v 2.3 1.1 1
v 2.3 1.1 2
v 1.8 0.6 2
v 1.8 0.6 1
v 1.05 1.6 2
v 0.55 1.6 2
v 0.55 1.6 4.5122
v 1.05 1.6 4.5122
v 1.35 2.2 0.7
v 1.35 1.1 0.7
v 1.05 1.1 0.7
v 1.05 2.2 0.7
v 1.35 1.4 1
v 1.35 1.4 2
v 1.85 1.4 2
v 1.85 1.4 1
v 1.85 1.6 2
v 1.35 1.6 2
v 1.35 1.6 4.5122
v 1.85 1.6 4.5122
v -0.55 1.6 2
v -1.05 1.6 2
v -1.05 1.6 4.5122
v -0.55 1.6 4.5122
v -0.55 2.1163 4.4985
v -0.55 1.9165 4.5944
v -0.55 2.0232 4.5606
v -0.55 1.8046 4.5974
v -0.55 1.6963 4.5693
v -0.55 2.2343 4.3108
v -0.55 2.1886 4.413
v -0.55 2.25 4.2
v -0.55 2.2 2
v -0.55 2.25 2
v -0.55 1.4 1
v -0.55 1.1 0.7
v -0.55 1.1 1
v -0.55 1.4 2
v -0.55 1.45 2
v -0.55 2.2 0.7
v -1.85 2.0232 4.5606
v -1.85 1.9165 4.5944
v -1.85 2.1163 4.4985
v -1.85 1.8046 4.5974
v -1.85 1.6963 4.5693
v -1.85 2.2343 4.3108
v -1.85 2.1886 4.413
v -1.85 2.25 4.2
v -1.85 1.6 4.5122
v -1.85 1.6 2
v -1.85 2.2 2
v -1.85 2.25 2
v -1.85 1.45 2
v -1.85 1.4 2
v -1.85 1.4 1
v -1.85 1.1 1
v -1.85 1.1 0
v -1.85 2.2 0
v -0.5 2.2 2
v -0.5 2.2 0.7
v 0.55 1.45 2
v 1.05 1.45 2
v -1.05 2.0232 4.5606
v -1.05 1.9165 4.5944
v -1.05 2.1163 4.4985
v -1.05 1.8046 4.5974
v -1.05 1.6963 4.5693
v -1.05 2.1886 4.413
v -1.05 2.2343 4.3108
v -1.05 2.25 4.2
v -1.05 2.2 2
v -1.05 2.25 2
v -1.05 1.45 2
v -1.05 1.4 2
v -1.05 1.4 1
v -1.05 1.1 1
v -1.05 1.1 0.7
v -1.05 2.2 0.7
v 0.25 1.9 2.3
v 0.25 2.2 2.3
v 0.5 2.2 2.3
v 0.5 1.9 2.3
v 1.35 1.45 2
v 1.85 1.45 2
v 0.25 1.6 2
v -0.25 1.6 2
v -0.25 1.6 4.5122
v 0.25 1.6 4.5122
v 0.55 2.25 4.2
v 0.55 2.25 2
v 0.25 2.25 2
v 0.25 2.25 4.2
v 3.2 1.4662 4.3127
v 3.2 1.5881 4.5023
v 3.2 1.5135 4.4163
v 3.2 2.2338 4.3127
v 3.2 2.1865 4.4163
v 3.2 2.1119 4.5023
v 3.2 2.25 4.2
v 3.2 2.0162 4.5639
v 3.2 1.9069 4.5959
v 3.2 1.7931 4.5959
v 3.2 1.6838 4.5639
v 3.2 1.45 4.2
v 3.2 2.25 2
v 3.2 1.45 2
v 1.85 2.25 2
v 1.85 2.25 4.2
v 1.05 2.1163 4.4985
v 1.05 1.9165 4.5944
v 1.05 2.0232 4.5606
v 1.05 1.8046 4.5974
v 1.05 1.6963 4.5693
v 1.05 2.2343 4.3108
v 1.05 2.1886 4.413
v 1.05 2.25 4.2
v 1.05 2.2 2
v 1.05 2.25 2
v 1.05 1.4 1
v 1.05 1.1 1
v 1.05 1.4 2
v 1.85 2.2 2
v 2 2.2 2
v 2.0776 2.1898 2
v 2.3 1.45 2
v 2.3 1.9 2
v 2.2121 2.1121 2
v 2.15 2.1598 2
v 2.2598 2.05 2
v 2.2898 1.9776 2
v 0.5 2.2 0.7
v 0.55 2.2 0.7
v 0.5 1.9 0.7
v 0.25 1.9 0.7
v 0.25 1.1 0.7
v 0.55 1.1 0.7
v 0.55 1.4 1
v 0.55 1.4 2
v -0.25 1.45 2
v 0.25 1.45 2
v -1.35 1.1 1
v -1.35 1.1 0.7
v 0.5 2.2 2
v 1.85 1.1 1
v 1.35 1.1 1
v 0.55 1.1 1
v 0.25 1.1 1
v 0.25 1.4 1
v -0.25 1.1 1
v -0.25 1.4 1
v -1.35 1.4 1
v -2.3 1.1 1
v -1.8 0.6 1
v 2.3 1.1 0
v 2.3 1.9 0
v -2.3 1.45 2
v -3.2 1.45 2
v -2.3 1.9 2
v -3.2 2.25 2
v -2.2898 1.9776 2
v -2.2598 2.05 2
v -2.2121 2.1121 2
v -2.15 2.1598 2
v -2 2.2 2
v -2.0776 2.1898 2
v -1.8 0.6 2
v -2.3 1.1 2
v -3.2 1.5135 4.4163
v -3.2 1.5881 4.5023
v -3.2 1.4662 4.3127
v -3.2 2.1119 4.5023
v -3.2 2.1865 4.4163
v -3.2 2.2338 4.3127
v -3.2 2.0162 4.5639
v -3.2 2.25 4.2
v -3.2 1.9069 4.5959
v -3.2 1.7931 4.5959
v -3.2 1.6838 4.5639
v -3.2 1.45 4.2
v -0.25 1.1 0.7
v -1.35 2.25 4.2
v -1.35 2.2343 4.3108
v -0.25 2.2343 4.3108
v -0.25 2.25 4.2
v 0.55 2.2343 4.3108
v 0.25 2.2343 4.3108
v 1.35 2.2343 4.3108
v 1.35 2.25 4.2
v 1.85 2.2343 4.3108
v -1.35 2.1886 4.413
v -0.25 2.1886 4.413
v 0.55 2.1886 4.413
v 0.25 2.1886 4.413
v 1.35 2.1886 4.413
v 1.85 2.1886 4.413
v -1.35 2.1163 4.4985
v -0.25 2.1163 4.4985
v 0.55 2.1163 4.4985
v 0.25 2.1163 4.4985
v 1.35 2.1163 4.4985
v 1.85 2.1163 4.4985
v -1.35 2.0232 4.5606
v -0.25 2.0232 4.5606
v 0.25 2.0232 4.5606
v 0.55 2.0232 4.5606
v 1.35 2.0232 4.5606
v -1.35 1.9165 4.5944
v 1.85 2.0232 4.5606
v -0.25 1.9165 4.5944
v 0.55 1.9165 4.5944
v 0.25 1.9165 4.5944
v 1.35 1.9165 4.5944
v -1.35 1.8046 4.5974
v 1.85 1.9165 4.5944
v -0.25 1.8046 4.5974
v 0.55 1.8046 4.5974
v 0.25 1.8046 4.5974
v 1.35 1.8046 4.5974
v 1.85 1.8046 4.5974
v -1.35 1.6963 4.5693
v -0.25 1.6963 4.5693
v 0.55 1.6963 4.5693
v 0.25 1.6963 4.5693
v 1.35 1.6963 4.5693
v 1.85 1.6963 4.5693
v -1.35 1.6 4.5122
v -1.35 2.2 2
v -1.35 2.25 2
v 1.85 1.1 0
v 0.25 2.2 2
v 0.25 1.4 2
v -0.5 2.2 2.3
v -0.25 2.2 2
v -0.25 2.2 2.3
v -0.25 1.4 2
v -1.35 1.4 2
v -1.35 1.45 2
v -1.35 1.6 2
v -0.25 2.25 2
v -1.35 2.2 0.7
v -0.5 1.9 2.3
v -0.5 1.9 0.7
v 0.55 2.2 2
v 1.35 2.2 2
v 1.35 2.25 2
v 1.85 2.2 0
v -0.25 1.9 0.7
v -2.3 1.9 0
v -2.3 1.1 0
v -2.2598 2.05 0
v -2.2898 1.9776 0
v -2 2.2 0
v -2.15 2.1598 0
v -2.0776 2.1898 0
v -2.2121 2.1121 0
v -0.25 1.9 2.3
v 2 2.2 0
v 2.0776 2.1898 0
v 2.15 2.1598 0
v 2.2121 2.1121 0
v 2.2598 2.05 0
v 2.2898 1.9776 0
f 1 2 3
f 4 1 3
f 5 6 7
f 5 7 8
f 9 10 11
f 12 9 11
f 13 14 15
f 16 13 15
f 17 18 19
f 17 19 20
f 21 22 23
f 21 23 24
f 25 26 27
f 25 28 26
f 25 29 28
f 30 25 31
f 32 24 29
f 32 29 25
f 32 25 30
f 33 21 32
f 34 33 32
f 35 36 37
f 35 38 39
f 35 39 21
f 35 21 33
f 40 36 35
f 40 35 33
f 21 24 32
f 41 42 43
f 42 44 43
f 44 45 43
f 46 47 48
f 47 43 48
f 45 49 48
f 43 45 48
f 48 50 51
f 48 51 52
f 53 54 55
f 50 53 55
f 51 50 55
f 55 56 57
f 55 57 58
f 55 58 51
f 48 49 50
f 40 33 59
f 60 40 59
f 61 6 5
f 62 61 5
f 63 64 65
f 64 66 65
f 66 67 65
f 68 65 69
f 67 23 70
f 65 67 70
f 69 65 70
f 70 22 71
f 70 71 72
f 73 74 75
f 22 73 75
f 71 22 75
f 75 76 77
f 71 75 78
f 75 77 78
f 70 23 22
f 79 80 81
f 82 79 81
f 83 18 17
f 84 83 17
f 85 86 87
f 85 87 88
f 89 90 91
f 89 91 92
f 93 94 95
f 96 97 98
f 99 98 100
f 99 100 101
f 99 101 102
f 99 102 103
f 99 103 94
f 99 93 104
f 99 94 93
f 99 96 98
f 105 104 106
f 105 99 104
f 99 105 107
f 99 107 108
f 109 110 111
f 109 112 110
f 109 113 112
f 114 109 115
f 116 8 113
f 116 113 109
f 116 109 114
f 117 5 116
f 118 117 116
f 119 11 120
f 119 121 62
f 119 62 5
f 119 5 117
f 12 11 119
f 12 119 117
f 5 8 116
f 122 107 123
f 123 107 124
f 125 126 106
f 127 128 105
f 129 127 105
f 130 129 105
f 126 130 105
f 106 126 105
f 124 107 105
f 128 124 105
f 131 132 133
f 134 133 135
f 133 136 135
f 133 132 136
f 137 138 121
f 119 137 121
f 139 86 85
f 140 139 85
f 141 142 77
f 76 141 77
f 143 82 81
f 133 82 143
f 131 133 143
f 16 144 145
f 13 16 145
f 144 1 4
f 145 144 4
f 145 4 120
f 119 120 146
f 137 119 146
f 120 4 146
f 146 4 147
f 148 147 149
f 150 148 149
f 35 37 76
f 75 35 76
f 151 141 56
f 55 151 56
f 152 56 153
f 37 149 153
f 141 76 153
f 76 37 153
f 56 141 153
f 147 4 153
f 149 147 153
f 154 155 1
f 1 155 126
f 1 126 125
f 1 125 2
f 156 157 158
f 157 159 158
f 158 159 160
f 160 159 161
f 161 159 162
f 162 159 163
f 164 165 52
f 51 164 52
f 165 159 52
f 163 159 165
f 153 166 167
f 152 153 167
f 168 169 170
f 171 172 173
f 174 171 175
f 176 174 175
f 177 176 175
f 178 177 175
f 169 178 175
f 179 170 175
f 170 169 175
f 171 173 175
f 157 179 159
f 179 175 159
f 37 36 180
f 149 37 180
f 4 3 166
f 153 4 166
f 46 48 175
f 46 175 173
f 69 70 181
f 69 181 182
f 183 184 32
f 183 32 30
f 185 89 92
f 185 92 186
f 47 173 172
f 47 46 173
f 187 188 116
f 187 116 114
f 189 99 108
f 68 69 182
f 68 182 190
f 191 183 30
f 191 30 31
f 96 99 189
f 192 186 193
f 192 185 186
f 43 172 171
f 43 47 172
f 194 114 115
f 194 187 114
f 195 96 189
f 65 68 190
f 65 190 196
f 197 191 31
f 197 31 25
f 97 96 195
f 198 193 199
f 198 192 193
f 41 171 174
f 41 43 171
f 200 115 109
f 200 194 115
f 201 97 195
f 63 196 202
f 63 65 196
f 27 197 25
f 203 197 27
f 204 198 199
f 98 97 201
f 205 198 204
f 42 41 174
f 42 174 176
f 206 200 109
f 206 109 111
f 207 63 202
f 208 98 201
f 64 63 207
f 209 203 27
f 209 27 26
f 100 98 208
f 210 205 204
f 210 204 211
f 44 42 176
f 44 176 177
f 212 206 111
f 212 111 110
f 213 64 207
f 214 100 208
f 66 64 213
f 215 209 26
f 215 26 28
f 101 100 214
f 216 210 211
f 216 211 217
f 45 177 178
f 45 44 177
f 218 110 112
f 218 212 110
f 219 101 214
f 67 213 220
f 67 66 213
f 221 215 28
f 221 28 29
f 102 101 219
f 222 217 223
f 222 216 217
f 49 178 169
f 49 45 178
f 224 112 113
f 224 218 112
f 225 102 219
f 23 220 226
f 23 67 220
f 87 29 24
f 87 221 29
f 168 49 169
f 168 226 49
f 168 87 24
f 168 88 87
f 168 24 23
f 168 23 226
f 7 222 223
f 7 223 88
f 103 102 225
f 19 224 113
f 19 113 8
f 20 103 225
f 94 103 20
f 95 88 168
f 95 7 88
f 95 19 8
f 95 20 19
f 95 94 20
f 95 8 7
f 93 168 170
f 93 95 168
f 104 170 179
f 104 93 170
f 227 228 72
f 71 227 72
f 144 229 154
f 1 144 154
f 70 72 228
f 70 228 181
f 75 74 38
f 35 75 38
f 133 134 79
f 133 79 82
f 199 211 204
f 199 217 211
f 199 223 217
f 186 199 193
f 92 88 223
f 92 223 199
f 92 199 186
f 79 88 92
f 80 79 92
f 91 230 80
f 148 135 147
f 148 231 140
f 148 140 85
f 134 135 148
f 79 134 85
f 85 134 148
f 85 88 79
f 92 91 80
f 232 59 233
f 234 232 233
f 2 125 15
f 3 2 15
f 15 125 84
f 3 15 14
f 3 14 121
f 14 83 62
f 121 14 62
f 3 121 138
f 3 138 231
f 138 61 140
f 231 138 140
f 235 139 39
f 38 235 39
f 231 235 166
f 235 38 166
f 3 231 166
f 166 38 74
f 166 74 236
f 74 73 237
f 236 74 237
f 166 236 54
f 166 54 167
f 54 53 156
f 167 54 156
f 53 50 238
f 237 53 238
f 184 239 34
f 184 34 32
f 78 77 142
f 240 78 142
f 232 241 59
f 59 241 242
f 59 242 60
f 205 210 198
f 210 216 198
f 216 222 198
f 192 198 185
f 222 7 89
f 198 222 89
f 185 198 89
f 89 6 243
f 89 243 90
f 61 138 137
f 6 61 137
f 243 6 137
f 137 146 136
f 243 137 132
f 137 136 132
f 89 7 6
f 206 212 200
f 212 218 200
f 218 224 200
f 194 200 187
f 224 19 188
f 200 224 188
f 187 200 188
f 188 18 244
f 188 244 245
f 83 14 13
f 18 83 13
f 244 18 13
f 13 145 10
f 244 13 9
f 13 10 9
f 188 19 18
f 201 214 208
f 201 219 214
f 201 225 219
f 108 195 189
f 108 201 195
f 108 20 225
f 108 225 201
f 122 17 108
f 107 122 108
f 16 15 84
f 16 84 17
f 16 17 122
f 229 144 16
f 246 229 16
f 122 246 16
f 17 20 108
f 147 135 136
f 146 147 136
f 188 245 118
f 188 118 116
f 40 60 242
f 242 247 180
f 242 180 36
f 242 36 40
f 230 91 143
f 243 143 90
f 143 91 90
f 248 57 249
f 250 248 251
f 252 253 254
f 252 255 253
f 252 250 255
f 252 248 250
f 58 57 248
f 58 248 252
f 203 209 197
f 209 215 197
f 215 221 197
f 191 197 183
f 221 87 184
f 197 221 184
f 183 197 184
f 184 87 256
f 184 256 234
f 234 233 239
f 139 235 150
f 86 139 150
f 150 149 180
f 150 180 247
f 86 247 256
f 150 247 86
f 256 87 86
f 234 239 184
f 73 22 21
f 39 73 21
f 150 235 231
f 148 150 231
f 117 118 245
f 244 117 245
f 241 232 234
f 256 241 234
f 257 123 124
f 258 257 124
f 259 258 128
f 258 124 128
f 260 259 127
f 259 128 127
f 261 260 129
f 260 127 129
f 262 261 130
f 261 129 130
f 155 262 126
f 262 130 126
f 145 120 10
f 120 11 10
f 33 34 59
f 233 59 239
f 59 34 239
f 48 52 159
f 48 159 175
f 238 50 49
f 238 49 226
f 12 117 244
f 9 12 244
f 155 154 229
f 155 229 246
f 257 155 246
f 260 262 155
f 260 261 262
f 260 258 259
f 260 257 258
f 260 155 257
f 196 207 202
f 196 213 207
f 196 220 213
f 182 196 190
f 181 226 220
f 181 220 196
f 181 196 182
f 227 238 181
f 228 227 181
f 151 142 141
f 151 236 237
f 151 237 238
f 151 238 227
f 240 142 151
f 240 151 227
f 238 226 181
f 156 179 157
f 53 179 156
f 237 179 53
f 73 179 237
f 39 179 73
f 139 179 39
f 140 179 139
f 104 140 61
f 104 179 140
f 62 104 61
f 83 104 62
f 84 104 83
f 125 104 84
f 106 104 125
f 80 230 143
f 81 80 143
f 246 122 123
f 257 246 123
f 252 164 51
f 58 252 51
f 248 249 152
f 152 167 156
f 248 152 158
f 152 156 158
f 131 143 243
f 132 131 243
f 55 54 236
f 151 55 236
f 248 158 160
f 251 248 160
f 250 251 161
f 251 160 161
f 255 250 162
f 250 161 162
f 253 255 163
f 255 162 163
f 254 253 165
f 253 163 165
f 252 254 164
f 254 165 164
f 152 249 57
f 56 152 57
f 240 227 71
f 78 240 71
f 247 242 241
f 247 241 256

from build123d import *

# Parameters (mm, degrees)
BOSS_EXTRUDE1_DEPTH = 2
BOSS_EXTRUDE2_DEPTH = 3.2
SKETCH3_OUTSIDE_W   = 10.04
SKETCH3_OUTSIDE_H   = 5.89
CUT_EXTRUDE1_DEPTH  = 4.8
SKETCH4_W           = 1
SKETCH4_H           = 0.3
CUT_EXTRUDE3_DEPTH  = 2.3
CUT_EXTRUDE6_DEPTH  = 7.038418667
SKETCH6_W           = 0.5
SKETCH6_H           = 0.5
CUT_EXTRUDE7_DEPTH  = 2
SKETCH7_W           = 0.5
SKETCH7_H           = 0.8
CUT_EXTRUDE8_DEPTH  = 7
SKETCH8_W           = 6
SKETCH8_H           = 1
CUT_EXTRUDE9_DEPTH  = 0.5


with BuildPart() as part:
    # Sketch1 → Boss-Extrude1 (new body)
    with BuildSketch(Plane.XY):
        with BuildLine():
            Line((-2.7, 1.5), (2.7, 1.5))
            ThreePointArc((2.7, 1.5), (2.912132034, 1.412132034), (3, 1.2))
            Line((3, 1.2), (3, 0))
            Line((3, 0), (-3, 0))
            Line((-3, 0), (-3, 1.2))
            ThreePointArc((-3, 1.2), (-2.912132034, 1.412132034), (-2.7, 1.5))
        make_face()
    extrude(amount=BOSS_EXTRUDE1_DEPTH)

    # Sketch2 → Boss-Extrude2 (add, symmetric)
    with BuildSketch(Plane(origin=(0, 0, 0), x_dir=(0, 0, -1), z_dir=(1, 0, 0))):
        with BuildLine():
            Line((0, 2.25), (-4.2, 2.25))
            ThreePointArc((-4.2, 2.25), (-4.6, 1.85), (-4.2, 1.45))
            Line((-4.2, 1.45), (0, 1.45))
            Line((0, 1.45), (0, 2.25))
        make_face()
    extrude(amount=BOSS_EXTRUDE2_DEPTH, both=True)

    # Sketch3 outside → Cut-Extrude1 (cut)
    with BuildSketch(Plane.XY.offset(2)):
        with Locations((0, 1.125)):
            Rectangle(SKETCH3_OUTSIDE_W, SKETCH3_OUTSIDE_H)
        with BuildLine():
            Line((-2, 2.2), (2, 2.2))
            ThreePointArc((2, 2.2), (2.212132034, 2.112132034), (2.3, 1.9))
            Line((2.3, 1.9), (2.3, 1.1))
            Line((2.3, 1.1), (1.8, 0.6))
            Line((1.8, 0.6), (-1.8, 0.6))
            Line((-1.8, 0.6), (-2.3, 1.1))
            Line((-2.3, 1.1), (-2.3, 1.9))
            ThreePointArc((-2.3, 1.9), (-2.212132034, 2.112132034), (-2, 2.2))
        make_face(mode=Mode.SUBTRACT)
    extrude(amount=-CUT_EXTRUDE1_DEPTH, mode=Mode.SUBTRACT)

    # Sketch4 → Cut-Extrude3 (cut)
    with BuildSketch(Plane.XY):
        with Locations((0, 2.05)):
            Rectangle(SKETCH4_W, SKETCH4_H)
    extrude(amount=CUT_EXTRUDE3_DEPTH, mode=Mode.SUBTRACT)

    # Sketch5 → Cut-Extrude6 (cut, through all)
    with BuildSketch(Plane(origin=(0, 0, 0), x_dir=(1, 0, 0), z_dir=(0, 1, 0))):
        Polygon((-1.85, 0), (1.85, 0), (1.85, -1), (1.35, -1), (1.35, -0.7), (1.05, -0.7), (1.05, -1), (0.55, -1), (0.55, -0.7), (0.25, -0.7), (0.25, -1), (-0.25, -1), (-0.25, -0.7), (-0.55, -0.7), (-0.55, -1), (-1.05, -1), (-1.05, -0.7), (-1.35, -0.7), (-1.35, -1), (-1.85, -1), align=None)
    extrude(amount=CUT_EXTRUDE6_DEPTH, mode=Mode.SUBTRACT)

    # Sketch6 → Cut-Extrude7 (cut)
    with BuildSketch(Plane.XY.offset(2)):
        with Locations((1.6, 1.65)):
            Rectangle(SKETCH6_W, SKETCH6_H)
        with Locations((0.8, 1.65)):
            Rectangle(SKETCH6_W, SKETCH6_H)
        with Locations((0, 1.65)):
            Rectangle(SKETCH6_W, SKETCH6_H)
        with Locations((-0.8, 1.65)):
            Rectangle(SKETCH6_W, SKETCH6_H)
        with Locations((-1.6, 1.65)):
            Rectangle(SKETCH6_W, SKETCH6_H)
    extrude(amount=-CUT_EXTRUDE7_DEPTH, mode=Mode.SUBTRACT)

    # Sketch7 → Cut-Extrude8 (cut)
    with BuildSketch(Plane.XY):
        with Locations((1.6, 2)):
            Rectangle(SKETCH7_W, SKETCH7_H)
        with Locations((0.8, 2)):
            Rectangle(SKETCH7_W, SKETCH7_H)
        with Locations((0, 2)):
            Rectangle(SKETCH7_W, SKETCH7_H)
        with Locations((-0.8, 2)):
            Rectangle(SKETCH7_W, SKETCH7_H)
        with Locations((-1.6, 2)):
            Rectangle(SKETCH7_W, SKETCH7_H)
    extrude(amount=CUT_EXTRUDE8_DEPTH, mode=Mode.SUBTRACT)

    # Sketch8 → Cut-Extrude9 (cut)
    with BuildSketch(Plane(origin=(0, 0.6, 0), x_dir=(1, 0, 0), z_dir=(0, 1, 0))):
        with Locations((0, -0.5)):
            Rectangle(SKETCH8_W, SKETCH8_H)
    extrude(amount=CUT_EXTRUDE9_DEPTH, mode=Mode.SUBTRACT)


solid = part.part
